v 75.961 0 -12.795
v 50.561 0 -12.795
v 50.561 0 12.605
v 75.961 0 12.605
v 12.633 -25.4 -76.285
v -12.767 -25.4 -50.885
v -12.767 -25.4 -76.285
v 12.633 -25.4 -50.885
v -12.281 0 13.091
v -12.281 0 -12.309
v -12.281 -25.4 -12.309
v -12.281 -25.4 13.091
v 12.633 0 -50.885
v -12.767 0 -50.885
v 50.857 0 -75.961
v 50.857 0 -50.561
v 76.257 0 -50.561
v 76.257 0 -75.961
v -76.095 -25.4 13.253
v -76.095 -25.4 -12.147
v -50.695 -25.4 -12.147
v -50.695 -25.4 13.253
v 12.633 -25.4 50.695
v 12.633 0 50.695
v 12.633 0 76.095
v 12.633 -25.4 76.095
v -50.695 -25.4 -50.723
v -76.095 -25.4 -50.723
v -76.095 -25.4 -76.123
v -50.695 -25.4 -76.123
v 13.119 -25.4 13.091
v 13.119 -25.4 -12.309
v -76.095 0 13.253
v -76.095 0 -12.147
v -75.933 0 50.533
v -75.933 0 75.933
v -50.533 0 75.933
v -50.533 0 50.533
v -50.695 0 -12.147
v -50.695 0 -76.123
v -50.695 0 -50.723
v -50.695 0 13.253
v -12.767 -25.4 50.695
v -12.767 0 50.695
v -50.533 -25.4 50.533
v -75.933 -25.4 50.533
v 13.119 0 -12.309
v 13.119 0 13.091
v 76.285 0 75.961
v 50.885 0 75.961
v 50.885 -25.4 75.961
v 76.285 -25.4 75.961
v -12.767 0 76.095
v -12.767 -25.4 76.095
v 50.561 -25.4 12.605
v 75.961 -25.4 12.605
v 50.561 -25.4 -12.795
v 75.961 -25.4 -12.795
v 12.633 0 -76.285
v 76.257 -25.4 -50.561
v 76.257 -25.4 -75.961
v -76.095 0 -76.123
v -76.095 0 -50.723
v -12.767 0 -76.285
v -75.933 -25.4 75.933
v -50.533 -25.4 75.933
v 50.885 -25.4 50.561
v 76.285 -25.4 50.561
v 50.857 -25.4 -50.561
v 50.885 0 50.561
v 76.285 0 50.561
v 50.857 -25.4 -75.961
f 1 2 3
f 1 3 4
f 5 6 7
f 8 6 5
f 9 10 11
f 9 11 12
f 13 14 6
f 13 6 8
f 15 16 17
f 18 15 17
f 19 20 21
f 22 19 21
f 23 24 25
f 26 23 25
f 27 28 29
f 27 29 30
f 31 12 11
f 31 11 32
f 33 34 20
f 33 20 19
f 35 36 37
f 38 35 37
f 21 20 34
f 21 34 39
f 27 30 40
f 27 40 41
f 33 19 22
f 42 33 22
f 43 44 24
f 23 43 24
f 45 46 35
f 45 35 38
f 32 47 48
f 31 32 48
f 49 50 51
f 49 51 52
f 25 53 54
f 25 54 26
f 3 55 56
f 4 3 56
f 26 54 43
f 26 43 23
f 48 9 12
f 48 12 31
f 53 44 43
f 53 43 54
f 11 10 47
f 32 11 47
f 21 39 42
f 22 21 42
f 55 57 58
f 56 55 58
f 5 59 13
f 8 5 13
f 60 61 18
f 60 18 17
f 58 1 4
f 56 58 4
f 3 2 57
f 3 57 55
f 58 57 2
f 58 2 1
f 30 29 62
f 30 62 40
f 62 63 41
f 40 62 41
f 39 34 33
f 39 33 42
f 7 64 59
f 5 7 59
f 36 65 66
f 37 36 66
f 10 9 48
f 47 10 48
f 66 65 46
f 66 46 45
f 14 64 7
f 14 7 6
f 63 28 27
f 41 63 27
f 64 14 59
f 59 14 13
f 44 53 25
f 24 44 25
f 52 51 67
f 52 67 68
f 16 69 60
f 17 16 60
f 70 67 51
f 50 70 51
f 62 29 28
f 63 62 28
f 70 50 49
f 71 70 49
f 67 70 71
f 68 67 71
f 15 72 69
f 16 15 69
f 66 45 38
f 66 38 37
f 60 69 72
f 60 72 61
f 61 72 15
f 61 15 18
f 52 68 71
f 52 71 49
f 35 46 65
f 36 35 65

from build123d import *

# Parameters (mm, degrees)
F0_W     = 25.4
F0_H     = 25.4
F1_W     = 25.4
F1_H     = 25.4
F2_W     = 25.4
F2_H     = 25.4
F3_W     = 25.4
F3_H     = 25.4
F4_W     = 25.4
F4_H     = 25.4
F8_W     = 25.4
F8_H     = 25.4
F6_W     = 25.4
F6_H     = 25.4
F5_W     = 25.4
F5_H     = 25.4
F7_W     = 25.4
F7_H     = 25.4
F9_DEPTH = 25.4


with BuildPart() as f9:
    # F0 (on Front) + F1 (on Front) + F2 (on Front) + F3 (on Front) + F4 (on Front) + F8 (on Front) + F6 (on Front) + F5 (on Front) + F7 (on Front) → F9 (new body)
    with BuildSketch(Plane.XZ):
        with Locations((-63.232632, 63.232632)):
            Rectangle(F0_W, F0_H)
    with BuildSketch(Plane.XZ):
        with Locations((-63.394596, -63.42288)):
            Rectangle(F1_W, F1_H)
    with BuildSketch(Plane.XZ):
        with Locations((-0.066841, 63.394592)):
            Rectangle(F2_W, F2_H)
    with BuildSketch(Plane.XZ):
        with Locations((-0.066841, -63.584841)):
            Rectangle(F3_W, F3_H)
    with BuildSketch(Plane.XZ):
        with Locations((-63.394596, 0.552733)):
            Rectangle(F4_W, F4_H)
    with BuildSketch(Plane.XZ):
        with Locations((63.260912, -0.095121)):
            Rectangle(F8_W, F8_H)
    with BuildSketch(Plane.XZ):
        with Locations((63.584833, 63.260912)):
            Rectangle(F6_W, F6_H)
    with BuildSketch(Plane.XZ):
        with Locations((0.419048, 0.390768)):
            Rectangle(F5_W, F5_H)
    with BuildSketch(Plane.XZ):
        with Locations((63.55656, -63.260912)):
            Rectangle(F7_W, F7_H)
    extrude(amount=F9_DEPTH)


solid = f9.part
